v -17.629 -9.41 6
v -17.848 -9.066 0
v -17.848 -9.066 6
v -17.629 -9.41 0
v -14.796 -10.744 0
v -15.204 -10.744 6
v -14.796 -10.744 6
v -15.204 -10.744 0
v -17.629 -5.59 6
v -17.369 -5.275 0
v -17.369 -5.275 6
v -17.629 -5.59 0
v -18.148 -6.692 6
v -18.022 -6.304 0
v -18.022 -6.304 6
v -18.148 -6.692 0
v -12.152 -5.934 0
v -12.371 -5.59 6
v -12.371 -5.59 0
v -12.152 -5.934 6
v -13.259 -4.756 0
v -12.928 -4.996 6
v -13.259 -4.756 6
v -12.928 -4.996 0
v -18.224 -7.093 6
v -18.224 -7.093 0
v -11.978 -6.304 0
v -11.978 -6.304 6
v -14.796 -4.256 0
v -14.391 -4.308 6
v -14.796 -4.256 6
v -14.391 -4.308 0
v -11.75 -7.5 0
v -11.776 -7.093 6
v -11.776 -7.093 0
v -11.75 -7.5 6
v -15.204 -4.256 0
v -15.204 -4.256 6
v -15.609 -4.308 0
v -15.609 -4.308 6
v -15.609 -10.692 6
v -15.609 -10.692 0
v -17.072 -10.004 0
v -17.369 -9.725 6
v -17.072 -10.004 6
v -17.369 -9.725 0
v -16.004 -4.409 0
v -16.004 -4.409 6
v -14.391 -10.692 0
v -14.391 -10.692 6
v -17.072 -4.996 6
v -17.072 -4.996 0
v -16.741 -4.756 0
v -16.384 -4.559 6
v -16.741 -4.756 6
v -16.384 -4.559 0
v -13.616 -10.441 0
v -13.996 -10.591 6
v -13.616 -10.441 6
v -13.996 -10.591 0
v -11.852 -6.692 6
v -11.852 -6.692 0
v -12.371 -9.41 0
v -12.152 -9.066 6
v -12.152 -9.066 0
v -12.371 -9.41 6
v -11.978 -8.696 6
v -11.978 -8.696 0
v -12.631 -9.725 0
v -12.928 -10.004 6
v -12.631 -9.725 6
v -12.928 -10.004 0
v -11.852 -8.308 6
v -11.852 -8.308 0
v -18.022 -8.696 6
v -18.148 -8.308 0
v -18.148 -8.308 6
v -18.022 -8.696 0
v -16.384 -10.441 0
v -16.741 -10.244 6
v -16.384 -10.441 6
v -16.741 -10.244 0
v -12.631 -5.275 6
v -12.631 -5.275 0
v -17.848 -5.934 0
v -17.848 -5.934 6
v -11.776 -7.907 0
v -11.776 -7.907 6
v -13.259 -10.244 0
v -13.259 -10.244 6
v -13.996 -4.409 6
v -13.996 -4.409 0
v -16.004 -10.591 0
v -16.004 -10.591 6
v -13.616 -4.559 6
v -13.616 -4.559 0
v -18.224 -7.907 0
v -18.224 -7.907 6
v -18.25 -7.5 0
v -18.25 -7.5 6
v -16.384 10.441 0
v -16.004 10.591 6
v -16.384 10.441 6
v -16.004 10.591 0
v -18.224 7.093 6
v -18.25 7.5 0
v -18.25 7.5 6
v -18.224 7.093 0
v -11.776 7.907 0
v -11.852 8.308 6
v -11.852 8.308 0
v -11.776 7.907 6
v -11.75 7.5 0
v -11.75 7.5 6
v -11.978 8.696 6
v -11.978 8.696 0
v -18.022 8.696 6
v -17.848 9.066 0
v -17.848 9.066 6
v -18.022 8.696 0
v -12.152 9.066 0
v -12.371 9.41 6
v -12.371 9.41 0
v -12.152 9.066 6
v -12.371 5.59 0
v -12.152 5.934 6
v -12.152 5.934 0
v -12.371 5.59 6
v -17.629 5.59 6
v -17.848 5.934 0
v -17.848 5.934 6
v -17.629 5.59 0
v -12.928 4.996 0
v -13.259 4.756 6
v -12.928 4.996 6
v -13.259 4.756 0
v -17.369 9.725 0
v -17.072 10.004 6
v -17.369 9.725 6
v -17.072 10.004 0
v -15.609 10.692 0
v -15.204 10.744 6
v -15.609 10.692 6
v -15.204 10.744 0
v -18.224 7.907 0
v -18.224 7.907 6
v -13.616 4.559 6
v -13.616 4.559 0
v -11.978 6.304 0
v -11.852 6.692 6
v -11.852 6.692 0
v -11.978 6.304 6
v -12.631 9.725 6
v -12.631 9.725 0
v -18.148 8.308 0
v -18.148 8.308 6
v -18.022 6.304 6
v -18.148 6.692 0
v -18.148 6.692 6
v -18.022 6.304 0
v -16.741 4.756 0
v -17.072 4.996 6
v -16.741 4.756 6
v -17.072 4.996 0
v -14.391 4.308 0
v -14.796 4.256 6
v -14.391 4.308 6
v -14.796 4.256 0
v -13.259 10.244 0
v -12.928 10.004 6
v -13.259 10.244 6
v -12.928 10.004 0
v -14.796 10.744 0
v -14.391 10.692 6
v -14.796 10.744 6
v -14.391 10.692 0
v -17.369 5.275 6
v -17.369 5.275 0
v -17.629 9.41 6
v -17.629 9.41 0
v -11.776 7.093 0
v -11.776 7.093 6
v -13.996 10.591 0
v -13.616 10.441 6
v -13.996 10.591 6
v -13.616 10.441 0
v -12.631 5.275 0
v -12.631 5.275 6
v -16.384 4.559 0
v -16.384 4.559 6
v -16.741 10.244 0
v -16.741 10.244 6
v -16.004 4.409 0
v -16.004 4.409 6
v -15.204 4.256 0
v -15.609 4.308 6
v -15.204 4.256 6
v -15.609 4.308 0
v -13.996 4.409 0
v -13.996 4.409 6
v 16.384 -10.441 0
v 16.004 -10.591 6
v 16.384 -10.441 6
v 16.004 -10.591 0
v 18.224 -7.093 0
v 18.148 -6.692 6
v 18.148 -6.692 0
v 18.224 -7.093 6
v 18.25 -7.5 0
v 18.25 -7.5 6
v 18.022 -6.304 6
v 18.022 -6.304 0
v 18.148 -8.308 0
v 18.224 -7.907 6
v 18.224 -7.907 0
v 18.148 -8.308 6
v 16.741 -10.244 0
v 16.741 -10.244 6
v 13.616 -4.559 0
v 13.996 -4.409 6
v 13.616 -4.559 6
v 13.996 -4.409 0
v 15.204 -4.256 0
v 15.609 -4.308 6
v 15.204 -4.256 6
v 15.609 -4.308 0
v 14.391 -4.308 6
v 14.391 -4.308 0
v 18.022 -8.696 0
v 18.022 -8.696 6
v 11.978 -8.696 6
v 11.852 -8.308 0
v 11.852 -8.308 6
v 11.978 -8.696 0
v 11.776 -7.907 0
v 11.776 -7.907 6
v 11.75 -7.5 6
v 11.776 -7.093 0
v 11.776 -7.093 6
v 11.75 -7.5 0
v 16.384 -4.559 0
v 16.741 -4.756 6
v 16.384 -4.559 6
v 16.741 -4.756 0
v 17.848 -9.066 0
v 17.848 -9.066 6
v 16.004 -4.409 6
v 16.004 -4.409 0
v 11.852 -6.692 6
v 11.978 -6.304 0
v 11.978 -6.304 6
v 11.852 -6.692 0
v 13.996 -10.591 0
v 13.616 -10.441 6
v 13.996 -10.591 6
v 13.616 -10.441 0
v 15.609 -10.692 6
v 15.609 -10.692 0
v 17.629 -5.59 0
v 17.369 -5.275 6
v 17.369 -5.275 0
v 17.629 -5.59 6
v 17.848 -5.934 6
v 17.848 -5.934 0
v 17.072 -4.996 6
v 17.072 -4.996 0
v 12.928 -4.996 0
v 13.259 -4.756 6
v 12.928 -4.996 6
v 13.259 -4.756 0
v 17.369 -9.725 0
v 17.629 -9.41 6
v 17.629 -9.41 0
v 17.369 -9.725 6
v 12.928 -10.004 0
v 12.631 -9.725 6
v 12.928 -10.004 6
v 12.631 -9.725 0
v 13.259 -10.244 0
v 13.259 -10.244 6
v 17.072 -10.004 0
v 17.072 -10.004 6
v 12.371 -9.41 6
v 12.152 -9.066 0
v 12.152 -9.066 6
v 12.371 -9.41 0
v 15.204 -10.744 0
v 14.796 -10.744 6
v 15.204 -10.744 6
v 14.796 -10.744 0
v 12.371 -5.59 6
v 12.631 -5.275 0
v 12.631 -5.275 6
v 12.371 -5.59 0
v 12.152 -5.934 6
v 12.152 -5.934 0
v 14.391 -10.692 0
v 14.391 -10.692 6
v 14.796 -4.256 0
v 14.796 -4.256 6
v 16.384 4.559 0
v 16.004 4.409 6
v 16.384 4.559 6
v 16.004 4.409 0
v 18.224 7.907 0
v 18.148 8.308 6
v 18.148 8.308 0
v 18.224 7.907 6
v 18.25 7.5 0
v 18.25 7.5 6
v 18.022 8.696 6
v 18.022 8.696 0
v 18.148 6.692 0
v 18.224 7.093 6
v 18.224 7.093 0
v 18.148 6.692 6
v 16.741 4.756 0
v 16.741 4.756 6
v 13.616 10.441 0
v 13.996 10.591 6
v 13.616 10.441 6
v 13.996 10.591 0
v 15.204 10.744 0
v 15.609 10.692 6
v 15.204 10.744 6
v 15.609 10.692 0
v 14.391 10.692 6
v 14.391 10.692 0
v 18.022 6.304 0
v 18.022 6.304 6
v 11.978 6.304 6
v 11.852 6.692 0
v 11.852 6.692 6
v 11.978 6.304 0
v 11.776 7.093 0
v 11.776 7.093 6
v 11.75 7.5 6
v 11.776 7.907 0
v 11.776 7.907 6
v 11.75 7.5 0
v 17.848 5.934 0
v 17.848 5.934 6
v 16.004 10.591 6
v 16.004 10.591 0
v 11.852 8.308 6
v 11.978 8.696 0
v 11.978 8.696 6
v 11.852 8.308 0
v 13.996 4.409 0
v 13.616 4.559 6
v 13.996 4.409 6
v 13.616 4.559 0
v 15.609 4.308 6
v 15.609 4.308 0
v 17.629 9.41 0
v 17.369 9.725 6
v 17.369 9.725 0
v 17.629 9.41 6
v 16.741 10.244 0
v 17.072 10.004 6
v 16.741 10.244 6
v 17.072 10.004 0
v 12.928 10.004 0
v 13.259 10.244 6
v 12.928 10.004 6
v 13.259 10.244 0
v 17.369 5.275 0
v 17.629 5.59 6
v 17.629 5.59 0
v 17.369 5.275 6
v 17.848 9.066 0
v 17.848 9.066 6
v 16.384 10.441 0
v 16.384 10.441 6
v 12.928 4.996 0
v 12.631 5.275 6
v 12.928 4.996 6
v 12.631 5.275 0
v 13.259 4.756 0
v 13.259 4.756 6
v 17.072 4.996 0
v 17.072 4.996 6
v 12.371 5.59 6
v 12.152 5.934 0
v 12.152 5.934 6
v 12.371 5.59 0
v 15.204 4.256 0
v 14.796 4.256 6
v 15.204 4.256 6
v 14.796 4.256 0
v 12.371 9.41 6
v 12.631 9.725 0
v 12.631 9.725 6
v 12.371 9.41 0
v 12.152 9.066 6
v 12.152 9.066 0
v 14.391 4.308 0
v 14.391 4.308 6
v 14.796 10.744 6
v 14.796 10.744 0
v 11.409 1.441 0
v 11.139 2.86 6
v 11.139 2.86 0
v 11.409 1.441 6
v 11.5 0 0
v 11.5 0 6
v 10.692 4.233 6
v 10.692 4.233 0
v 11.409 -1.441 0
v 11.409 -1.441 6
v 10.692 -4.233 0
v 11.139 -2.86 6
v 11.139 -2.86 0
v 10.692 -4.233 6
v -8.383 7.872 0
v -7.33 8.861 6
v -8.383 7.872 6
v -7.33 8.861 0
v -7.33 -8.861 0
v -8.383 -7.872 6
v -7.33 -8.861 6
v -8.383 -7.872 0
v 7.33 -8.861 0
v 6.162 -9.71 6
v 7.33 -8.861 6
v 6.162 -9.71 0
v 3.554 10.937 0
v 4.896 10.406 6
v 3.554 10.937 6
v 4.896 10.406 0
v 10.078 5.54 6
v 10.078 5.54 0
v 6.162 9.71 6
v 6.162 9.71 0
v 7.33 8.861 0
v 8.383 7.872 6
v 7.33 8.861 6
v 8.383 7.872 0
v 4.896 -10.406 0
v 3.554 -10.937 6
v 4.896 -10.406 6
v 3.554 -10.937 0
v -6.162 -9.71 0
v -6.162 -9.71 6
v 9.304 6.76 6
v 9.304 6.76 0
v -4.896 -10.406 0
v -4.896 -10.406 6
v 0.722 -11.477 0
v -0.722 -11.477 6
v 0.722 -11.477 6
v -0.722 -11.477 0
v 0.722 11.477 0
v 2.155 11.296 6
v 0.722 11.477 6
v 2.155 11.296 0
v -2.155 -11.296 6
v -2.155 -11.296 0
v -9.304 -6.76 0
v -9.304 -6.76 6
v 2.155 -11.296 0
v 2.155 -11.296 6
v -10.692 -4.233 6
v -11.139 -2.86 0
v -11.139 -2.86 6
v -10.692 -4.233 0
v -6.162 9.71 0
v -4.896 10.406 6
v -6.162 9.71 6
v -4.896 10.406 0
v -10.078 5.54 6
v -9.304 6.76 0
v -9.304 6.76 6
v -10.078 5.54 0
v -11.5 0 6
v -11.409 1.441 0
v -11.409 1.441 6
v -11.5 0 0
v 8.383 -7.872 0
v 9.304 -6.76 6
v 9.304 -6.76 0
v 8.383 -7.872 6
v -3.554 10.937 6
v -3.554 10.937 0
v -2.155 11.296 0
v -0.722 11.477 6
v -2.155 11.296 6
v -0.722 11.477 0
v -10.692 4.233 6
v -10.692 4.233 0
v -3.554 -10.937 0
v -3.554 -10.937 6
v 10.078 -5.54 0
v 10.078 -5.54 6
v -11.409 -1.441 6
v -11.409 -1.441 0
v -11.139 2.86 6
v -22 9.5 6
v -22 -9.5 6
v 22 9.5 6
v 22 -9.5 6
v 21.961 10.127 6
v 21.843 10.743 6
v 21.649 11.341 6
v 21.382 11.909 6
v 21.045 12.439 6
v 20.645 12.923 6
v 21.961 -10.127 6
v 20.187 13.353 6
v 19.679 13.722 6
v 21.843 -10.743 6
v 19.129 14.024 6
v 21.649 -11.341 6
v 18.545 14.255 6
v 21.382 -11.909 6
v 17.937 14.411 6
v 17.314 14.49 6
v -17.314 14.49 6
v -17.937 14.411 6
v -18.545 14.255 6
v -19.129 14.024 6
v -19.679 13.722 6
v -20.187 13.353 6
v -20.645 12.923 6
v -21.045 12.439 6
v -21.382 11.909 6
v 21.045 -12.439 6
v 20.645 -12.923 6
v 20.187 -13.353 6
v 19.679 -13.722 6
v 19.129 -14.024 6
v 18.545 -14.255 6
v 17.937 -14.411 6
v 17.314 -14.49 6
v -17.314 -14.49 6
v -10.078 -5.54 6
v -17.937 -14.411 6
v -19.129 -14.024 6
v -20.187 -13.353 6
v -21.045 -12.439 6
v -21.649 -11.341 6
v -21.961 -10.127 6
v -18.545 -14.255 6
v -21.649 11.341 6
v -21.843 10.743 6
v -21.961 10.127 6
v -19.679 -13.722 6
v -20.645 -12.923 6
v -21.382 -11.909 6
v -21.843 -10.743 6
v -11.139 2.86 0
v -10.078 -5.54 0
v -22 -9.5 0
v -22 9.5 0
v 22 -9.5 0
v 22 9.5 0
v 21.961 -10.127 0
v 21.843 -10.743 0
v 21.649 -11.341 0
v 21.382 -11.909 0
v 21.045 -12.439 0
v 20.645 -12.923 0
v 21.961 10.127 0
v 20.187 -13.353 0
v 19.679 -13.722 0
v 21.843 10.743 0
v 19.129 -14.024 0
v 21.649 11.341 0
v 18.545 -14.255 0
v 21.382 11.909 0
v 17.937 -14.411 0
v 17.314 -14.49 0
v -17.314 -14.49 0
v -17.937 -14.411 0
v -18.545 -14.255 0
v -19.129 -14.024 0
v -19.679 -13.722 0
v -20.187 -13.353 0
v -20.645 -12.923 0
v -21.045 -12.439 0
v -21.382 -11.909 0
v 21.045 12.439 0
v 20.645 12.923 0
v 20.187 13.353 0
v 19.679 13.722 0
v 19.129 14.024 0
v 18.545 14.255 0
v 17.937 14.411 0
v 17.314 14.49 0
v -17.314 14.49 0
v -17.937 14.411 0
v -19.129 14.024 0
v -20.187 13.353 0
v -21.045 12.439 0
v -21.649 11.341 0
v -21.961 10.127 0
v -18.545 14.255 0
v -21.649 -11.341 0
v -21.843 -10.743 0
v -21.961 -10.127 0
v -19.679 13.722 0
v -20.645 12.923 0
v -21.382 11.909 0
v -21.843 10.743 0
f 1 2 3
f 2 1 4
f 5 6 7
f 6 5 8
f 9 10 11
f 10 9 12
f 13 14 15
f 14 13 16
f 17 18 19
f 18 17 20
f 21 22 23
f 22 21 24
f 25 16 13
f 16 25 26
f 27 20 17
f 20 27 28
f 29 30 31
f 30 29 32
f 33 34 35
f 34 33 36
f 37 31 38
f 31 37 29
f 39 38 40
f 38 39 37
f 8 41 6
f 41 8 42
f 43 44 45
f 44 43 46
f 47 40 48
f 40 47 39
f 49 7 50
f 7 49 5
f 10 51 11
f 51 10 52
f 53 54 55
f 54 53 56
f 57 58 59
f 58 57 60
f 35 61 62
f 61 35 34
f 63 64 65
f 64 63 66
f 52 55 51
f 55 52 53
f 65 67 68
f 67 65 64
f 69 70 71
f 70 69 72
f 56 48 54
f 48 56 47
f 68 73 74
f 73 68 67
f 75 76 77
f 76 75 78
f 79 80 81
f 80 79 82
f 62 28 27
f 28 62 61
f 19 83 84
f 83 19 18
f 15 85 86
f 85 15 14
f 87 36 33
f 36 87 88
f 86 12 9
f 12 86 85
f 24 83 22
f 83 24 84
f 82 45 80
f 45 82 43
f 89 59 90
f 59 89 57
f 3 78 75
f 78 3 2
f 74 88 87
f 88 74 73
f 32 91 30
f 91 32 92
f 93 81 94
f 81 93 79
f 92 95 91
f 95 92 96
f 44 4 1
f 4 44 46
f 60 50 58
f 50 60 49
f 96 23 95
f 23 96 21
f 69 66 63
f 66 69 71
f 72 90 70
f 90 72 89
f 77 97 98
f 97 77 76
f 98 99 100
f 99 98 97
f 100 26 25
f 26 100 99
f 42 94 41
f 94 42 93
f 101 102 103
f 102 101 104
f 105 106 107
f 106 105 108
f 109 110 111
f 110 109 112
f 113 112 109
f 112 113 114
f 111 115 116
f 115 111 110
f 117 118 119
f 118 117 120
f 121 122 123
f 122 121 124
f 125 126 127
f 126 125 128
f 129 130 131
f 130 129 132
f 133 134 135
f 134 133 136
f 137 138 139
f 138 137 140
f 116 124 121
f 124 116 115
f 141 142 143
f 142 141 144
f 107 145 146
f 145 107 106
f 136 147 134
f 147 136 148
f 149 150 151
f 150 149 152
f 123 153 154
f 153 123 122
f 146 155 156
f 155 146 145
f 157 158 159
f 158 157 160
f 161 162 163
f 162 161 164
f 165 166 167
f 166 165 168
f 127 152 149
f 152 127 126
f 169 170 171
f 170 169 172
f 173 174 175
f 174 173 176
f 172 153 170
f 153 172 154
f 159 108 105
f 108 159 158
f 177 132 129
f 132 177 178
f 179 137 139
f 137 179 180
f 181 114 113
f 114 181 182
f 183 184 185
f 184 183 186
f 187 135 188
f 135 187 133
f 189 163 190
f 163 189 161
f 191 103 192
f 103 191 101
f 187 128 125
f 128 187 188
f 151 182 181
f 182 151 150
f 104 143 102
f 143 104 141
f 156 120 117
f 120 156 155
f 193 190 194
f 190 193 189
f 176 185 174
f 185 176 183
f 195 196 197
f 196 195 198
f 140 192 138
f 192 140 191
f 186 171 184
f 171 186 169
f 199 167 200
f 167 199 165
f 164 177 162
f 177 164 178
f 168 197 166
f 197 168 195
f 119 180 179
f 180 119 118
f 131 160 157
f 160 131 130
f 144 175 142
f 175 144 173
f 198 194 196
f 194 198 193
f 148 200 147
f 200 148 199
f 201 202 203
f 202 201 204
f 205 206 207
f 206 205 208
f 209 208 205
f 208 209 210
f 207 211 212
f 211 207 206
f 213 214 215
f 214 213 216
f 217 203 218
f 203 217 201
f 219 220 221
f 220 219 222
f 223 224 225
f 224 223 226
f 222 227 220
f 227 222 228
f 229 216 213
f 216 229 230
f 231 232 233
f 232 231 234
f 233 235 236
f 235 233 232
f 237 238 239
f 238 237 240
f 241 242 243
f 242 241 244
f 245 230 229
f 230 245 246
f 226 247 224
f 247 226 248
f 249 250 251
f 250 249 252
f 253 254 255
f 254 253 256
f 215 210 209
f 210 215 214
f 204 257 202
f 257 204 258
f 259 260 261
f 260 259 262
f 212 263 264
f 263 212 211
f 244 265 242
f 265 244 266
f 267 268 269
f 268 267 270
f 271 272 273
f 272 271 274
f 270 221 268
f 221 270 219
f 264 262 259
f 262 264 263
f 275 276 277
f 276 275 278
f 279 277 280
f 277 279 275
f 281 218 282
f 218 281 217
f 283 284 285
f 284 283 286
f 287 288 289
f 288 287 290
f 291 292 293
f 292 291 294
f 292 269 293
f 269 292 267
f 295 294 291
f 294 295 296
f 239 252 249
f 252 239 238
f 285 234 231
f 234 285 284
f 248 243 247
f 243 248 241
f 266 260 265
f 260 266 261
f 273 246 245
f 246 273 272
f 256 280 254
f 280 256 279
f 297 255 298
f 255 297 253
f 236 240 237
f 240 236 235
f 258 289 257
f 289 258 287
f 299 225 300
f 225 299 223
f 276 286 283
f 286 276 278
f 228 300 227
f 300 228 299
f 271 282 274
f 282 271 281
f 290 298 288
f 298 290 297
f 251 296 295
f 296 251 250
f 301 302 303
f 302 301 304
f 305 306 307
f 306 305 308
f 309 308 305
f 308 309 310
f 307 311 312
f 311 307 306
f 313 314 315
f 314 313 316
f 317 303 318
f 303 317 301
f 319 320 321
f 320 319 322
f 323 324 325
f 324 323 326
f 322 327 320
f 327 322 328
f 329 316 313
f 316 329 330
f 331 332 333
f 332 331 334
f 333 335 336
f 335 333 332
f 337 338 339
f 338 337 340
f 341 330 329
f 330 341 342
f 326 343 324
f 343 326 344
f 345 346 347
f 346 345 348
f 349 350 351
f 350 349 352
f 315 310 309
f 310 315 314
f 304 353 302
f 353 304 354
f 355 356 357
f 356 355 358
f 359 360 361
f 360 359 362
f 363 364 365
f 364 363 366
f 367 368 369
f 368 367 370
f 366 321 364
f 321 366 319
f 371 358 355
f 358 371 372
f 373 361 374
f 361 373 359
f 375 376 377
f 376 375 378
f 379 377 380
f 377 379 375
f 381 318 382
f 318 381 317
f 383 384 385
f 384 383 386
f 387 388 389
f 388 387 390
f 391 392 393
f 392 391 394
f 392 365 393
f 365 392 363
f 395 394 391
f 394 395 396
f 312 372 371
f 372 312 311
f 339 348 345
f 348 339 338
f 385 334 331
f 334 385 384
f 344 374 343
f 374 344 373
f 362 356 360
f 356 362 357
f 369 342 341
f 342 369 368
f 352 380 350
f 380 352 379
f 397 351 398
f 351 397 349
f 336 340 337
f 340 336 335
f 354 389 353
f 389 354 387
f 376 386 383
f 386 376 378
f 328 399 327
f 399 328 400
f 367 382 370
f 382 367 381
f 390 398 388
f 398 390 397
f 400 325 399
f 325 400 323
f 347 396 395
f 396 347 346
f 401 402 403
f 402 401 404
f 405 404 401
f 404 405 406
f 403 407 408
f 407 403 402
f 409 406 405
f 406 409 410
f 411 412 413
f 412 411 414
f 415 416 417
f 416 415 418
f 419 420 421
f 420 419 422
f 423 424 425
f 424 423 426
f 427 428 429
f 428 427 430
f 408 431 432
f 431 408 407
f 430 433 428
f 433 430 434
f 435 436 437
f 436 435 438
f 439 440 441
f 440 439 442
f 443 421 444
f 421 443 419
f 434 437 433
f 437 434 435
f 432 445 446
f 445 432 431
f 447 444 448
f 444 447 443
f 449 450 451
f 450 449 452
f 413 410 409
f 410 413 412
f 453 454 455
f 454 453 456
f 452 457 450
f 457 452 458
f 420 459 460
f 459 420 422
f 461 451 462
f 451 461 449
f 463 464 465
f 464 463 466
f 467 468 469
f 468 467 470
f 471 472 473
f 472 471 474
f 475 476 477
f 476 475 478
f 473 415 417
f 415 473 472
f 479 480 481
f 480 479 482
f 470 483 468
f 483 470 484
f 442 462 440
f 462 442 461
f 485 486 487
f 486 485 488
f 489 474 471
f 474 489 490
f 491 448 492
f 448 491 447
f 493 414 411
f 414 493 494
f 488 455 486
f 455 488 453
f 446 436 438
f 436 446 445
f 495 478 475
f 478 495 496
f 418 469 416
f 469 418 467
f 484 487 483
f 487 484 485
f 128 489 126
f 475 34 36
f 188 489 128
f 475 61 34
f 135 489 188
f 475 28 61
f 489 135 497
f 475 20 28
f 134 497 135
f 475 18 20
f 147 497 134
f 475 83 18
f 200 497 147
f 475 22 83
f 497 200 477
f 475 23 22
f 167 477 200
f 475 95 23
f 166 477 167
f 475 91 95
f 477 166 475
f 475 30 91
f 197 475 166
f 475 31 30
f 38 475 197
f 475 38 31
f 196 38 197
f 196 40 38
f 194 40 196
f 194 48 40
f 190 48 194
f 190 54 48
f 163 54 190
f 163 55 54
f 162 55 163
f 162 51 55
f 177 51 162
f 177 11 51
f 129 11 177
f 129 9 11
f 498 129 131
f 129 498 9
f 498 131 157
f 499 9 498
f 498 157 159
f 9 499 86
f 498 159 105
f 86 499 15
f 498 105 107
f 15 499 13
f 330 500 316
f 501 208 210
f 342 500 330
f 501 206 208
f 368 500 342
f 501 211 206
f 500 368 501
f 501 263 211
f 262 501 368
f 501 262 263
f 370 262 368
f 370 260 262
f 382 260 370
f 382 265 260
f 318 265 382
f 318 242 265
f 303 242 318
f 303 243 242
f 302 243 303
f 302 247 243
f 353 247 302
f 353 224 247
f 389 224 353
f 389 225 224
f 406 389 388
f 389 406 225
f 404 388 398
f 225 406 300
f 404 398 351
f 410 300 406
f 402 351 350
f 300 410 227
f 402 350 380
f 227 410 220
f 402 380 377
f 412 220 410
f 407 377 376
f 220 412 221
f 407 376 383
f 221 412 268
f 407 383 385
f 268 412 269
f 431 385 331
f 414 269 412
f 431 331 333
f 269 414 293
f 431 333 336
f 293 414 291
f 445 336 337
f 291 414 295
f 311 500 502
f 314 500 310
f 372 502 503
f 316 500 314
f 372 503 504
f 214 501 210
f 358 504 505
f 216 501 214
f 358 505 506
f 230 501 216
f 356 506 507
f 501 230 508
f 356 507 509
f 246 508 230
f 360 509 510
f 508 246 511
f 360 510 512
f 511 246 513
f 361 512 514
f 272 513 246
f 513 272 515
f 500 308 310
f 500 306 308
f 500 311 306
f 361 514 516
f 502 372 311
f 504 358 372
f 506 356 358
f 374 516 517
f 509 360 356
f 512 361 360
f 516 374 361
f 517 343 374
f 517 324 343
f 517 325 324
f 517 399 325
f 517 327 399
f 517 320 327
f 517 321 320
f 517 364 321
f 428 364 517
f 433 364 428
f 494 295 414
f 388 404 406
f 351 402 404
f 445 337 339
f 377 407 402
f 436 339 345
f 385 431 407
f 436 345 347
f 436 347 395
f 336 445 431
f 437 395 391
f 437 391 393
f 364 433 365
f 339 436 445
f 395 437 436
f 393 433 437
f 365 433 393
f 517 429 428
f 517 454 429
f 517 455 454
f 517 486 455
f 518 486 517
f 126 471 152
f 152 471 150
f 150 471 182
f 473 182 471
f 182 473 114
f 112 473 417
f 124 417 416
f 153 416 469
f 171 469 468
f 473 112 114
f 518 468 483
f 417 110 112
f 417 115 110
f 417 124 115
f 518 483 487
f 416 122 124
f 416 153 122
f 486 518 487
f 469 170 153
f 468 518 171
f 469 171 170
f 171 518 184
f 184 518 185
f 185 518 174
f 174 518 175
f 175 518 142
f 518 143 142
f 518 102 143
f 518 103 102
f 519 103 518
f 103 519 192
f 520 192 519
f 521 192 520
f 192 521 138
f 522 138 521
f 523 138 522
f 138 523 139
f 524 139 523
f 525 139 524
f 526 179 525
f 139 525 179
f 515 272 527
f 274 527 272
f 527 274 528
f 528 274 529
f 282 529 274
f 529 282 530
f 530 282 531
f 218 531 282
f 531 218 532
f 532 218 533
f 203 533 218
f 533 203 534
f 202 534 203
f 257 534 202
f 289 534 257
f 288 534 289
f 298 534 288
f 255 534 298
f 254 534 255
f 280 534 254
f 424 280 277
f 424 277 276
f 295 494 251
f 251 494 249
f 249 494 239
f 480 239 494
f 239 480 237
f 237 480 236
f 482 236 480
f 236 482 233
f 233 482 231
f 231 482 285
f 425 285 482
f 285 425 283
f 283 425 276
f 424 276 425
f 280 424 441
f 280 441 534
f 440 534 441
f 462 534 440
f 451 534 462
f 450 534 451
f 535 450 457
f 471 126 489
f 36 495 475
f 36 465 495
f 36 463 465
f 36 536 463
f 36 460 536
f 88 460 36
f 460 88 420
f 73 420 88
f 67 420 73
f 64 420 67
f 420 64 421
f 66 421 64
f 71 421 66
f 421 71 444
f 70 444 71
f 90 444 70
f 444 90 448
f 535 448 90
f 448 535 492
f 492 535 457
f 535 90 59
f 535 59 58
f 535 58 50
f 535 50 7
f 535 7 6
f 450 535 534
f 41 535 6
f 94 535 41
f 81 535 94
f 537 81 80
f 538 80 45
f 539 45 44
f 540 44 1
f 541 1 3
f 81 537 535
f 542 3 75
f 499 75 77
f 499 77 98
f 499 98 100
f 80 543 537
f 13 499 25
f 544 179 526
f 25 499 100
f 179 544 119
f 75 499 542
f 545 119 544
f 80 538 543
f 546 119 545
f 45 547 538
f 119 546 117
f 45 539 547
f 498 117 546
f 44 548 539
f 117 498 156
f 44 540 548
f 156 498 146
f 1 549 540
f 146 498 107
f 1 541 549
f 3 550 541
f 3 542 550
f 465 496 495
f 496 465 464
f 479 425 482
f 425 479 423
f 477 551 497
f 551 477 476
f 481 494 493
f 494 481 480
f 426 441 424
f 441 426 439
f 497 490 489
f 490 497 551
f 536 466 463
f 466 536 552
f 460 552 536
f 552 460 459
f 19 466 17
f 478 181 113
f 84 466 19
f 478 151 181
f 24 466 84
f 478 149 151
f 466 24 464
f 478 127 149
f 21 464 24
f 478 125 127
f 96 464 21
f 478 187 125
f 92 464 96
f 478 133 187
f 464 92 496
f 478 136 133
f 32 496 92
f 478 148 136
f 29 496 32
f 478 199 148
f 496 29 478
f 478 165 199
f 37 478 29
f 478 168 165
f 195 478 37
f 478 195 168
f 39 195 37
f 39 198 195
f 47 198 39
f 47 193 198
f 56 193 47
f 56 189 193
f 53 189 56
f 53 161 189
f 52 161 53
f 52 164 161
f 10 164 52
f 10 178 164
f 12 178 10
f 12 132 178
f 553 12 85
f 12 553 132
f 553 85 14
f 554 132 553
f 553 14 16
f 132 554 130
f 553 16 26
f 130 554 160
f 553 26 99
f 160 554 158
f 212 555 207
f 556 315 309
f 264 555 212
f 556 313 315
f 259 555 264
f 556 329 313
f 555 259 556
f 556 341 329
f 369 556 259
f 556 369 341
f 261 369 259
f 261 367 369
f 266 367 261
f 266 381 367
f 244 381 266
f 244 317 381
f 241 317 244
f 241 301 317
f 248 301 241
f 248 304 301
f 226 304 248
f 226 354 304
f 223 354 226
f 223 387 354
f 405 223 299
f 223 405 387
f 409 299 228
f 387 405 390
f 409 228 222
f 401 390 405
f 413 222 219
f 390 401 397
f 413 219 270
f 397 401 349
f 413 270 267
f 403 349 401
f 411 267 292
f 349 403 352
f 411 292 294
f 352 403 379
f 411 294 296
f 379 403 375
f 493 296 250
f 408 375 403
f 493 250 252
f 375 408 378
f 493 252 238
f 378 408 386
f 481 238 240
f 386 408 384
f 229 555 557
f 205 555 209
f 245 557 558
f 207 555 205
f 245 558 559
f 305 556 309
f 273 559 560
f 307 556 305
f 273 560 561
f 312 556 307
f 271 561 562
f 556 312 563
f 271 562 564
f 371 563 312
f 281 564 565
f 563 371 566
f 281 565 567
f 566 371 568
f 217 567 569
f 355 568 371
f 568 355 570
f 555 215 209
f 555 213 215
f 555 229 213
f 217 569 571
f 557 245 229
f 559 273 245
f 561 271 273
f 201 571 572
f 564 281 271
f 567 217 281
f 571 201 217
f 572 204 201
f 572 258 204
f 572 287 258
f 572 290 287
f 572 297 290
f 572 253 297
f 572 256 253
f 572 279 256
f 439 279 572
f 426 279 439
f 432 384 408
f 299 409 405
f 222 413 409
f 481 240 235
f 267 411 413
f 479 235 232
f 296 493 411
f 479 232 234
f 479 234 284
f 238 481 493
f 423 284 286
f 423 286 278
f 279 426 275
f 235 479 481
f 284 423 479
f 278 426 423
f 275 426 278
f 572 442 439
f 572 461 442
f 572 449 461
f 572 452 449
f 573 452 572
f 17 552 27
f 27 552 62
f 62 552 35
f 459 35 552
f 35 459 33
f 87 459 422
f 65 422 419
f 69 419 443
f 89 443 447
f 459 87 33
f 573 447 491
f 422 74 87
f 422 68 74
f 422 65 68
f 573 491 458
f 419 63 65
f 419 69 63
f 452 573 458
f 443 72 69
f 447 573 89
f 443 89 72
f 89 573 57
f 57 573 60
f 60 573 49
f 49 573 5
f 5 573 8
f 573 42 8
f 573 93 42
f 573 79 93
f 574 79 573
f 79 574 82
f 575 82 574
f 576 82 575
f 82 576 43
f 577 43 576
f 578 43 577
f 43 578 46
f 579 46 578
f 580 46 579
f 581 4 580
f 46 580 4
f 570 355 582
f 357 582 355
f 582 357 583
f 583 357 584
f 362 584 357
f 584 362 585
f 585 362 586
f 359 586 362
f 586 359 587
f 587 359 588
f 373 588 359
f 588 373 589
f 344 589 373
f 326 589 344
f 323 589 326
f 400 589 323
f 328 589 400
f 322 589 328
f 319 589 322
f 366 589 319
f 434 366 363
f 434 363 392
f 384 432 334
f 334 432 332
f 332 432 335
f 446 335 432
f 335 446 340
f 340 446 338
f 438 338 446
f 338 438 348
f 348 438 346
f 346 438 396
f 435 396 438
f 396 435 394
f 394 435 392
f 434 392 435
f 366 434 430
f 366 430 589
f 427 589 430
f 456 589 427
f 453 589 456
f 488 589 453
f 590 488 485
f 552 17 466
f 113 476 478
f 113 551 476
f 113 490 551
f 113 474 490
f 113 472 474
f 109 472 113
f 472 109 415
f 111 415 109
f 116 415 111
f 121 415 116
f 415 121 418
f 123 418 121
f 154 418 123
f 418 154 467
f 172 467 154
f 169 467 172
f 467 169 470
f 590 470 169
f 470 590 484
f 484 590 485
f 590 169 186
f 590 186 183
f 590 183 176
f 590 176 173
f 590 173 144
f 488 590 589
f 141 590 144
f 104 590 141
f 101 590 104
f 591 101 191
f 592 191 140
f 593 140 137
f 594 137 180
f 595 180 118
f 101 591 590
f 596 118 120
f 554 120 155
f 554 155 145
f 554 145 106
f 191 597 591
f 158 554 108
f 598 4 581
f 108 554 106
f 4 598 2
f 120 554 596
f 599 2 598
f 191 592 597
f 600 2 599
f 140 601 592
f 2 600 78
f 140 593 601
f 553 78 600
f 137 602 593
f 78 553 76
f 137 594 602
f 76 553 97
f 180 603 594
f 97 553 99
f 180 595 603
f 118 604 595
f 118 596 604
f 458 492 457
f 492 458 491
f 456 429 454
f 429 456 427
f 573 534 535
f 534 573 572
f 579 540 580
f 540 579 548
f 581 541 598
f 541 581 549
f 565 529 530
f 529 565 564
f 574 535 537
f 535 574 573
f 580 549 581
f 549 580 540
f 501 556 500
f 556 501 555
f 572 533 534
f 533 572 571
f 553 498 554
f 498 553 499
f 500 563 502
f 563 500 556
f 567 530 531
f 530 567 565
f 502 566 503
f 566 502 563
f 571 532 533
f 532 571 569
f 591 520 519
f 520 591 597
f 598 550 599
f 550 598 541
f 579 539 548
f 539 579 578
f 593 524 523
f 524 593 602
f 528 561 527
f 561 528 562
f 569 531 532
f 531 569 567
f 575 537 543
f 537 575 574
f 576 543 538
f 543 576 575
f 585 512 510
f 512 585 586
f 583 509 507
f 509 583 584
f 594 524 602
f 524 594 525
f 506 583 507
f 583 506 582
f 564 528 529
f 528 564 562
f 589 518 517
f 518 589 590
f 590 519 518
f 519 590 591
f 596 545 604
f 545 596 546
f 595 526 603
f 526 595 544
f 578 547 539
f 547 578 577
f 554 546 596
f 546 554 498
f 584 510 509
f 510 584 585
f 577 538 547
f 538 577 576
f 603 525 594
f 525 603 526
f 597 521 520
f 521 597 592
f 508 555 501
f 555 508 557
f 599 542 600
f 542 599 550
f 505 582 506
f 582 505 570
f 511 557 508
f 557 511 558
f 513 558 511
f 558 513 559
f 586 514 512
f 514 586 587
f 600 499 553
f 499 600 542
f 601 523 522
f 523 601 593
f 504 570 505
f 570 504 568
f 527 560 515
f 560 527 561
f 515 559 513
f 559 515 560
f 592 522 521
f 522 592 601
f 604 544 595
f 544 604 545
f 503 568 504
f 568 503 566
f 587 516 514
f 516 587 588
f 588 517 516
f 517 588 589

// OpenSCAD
$fn = 50;


difference() {
	union() {
		hull() {
			translate(v = [-17.0000000000, 9.5000000000, 0]) {
				cylinder(h = 6, r = 5);
			}
			translate(v = [17.0000000000, 9.5000000000, 0]) {
				cylinder(h = 6, r = 5);
			}
			translate(v = [-17.0000000000, -9.5000000000, 0]) {
				cylinder(h = 6, r = 5);
			}
			translate(v = [17.0000000000, -9.5000000000, 0]) {
				cylinder(h = 6, r = 5);
			}
		}
	}
	union() {
		#translate(v = [-15.0000000000, -7.5000000000, -100.0000000000]) {
			cylinder(h = 200, r = 3.2500000000);
		}
		#translate(v = [-15.0000000000, 7.5000000000, -100.0000000000]) {
			cylinder(h = 200, r = 3.2500000000);
		}
		#translate(v = [15.0000000000, -7.5000000000, -100.0000000000]) {
			cylinder(h = 200, r = 3.2500000000);
		}
		#translate(v = [15.0000000000, 7.5000000000, -100.0000000000]) {
			cylinder(h = 200, r = 3.2500000000);
		}
		#cylinder(h = 6, r = 11.5000000000);
	}
}
